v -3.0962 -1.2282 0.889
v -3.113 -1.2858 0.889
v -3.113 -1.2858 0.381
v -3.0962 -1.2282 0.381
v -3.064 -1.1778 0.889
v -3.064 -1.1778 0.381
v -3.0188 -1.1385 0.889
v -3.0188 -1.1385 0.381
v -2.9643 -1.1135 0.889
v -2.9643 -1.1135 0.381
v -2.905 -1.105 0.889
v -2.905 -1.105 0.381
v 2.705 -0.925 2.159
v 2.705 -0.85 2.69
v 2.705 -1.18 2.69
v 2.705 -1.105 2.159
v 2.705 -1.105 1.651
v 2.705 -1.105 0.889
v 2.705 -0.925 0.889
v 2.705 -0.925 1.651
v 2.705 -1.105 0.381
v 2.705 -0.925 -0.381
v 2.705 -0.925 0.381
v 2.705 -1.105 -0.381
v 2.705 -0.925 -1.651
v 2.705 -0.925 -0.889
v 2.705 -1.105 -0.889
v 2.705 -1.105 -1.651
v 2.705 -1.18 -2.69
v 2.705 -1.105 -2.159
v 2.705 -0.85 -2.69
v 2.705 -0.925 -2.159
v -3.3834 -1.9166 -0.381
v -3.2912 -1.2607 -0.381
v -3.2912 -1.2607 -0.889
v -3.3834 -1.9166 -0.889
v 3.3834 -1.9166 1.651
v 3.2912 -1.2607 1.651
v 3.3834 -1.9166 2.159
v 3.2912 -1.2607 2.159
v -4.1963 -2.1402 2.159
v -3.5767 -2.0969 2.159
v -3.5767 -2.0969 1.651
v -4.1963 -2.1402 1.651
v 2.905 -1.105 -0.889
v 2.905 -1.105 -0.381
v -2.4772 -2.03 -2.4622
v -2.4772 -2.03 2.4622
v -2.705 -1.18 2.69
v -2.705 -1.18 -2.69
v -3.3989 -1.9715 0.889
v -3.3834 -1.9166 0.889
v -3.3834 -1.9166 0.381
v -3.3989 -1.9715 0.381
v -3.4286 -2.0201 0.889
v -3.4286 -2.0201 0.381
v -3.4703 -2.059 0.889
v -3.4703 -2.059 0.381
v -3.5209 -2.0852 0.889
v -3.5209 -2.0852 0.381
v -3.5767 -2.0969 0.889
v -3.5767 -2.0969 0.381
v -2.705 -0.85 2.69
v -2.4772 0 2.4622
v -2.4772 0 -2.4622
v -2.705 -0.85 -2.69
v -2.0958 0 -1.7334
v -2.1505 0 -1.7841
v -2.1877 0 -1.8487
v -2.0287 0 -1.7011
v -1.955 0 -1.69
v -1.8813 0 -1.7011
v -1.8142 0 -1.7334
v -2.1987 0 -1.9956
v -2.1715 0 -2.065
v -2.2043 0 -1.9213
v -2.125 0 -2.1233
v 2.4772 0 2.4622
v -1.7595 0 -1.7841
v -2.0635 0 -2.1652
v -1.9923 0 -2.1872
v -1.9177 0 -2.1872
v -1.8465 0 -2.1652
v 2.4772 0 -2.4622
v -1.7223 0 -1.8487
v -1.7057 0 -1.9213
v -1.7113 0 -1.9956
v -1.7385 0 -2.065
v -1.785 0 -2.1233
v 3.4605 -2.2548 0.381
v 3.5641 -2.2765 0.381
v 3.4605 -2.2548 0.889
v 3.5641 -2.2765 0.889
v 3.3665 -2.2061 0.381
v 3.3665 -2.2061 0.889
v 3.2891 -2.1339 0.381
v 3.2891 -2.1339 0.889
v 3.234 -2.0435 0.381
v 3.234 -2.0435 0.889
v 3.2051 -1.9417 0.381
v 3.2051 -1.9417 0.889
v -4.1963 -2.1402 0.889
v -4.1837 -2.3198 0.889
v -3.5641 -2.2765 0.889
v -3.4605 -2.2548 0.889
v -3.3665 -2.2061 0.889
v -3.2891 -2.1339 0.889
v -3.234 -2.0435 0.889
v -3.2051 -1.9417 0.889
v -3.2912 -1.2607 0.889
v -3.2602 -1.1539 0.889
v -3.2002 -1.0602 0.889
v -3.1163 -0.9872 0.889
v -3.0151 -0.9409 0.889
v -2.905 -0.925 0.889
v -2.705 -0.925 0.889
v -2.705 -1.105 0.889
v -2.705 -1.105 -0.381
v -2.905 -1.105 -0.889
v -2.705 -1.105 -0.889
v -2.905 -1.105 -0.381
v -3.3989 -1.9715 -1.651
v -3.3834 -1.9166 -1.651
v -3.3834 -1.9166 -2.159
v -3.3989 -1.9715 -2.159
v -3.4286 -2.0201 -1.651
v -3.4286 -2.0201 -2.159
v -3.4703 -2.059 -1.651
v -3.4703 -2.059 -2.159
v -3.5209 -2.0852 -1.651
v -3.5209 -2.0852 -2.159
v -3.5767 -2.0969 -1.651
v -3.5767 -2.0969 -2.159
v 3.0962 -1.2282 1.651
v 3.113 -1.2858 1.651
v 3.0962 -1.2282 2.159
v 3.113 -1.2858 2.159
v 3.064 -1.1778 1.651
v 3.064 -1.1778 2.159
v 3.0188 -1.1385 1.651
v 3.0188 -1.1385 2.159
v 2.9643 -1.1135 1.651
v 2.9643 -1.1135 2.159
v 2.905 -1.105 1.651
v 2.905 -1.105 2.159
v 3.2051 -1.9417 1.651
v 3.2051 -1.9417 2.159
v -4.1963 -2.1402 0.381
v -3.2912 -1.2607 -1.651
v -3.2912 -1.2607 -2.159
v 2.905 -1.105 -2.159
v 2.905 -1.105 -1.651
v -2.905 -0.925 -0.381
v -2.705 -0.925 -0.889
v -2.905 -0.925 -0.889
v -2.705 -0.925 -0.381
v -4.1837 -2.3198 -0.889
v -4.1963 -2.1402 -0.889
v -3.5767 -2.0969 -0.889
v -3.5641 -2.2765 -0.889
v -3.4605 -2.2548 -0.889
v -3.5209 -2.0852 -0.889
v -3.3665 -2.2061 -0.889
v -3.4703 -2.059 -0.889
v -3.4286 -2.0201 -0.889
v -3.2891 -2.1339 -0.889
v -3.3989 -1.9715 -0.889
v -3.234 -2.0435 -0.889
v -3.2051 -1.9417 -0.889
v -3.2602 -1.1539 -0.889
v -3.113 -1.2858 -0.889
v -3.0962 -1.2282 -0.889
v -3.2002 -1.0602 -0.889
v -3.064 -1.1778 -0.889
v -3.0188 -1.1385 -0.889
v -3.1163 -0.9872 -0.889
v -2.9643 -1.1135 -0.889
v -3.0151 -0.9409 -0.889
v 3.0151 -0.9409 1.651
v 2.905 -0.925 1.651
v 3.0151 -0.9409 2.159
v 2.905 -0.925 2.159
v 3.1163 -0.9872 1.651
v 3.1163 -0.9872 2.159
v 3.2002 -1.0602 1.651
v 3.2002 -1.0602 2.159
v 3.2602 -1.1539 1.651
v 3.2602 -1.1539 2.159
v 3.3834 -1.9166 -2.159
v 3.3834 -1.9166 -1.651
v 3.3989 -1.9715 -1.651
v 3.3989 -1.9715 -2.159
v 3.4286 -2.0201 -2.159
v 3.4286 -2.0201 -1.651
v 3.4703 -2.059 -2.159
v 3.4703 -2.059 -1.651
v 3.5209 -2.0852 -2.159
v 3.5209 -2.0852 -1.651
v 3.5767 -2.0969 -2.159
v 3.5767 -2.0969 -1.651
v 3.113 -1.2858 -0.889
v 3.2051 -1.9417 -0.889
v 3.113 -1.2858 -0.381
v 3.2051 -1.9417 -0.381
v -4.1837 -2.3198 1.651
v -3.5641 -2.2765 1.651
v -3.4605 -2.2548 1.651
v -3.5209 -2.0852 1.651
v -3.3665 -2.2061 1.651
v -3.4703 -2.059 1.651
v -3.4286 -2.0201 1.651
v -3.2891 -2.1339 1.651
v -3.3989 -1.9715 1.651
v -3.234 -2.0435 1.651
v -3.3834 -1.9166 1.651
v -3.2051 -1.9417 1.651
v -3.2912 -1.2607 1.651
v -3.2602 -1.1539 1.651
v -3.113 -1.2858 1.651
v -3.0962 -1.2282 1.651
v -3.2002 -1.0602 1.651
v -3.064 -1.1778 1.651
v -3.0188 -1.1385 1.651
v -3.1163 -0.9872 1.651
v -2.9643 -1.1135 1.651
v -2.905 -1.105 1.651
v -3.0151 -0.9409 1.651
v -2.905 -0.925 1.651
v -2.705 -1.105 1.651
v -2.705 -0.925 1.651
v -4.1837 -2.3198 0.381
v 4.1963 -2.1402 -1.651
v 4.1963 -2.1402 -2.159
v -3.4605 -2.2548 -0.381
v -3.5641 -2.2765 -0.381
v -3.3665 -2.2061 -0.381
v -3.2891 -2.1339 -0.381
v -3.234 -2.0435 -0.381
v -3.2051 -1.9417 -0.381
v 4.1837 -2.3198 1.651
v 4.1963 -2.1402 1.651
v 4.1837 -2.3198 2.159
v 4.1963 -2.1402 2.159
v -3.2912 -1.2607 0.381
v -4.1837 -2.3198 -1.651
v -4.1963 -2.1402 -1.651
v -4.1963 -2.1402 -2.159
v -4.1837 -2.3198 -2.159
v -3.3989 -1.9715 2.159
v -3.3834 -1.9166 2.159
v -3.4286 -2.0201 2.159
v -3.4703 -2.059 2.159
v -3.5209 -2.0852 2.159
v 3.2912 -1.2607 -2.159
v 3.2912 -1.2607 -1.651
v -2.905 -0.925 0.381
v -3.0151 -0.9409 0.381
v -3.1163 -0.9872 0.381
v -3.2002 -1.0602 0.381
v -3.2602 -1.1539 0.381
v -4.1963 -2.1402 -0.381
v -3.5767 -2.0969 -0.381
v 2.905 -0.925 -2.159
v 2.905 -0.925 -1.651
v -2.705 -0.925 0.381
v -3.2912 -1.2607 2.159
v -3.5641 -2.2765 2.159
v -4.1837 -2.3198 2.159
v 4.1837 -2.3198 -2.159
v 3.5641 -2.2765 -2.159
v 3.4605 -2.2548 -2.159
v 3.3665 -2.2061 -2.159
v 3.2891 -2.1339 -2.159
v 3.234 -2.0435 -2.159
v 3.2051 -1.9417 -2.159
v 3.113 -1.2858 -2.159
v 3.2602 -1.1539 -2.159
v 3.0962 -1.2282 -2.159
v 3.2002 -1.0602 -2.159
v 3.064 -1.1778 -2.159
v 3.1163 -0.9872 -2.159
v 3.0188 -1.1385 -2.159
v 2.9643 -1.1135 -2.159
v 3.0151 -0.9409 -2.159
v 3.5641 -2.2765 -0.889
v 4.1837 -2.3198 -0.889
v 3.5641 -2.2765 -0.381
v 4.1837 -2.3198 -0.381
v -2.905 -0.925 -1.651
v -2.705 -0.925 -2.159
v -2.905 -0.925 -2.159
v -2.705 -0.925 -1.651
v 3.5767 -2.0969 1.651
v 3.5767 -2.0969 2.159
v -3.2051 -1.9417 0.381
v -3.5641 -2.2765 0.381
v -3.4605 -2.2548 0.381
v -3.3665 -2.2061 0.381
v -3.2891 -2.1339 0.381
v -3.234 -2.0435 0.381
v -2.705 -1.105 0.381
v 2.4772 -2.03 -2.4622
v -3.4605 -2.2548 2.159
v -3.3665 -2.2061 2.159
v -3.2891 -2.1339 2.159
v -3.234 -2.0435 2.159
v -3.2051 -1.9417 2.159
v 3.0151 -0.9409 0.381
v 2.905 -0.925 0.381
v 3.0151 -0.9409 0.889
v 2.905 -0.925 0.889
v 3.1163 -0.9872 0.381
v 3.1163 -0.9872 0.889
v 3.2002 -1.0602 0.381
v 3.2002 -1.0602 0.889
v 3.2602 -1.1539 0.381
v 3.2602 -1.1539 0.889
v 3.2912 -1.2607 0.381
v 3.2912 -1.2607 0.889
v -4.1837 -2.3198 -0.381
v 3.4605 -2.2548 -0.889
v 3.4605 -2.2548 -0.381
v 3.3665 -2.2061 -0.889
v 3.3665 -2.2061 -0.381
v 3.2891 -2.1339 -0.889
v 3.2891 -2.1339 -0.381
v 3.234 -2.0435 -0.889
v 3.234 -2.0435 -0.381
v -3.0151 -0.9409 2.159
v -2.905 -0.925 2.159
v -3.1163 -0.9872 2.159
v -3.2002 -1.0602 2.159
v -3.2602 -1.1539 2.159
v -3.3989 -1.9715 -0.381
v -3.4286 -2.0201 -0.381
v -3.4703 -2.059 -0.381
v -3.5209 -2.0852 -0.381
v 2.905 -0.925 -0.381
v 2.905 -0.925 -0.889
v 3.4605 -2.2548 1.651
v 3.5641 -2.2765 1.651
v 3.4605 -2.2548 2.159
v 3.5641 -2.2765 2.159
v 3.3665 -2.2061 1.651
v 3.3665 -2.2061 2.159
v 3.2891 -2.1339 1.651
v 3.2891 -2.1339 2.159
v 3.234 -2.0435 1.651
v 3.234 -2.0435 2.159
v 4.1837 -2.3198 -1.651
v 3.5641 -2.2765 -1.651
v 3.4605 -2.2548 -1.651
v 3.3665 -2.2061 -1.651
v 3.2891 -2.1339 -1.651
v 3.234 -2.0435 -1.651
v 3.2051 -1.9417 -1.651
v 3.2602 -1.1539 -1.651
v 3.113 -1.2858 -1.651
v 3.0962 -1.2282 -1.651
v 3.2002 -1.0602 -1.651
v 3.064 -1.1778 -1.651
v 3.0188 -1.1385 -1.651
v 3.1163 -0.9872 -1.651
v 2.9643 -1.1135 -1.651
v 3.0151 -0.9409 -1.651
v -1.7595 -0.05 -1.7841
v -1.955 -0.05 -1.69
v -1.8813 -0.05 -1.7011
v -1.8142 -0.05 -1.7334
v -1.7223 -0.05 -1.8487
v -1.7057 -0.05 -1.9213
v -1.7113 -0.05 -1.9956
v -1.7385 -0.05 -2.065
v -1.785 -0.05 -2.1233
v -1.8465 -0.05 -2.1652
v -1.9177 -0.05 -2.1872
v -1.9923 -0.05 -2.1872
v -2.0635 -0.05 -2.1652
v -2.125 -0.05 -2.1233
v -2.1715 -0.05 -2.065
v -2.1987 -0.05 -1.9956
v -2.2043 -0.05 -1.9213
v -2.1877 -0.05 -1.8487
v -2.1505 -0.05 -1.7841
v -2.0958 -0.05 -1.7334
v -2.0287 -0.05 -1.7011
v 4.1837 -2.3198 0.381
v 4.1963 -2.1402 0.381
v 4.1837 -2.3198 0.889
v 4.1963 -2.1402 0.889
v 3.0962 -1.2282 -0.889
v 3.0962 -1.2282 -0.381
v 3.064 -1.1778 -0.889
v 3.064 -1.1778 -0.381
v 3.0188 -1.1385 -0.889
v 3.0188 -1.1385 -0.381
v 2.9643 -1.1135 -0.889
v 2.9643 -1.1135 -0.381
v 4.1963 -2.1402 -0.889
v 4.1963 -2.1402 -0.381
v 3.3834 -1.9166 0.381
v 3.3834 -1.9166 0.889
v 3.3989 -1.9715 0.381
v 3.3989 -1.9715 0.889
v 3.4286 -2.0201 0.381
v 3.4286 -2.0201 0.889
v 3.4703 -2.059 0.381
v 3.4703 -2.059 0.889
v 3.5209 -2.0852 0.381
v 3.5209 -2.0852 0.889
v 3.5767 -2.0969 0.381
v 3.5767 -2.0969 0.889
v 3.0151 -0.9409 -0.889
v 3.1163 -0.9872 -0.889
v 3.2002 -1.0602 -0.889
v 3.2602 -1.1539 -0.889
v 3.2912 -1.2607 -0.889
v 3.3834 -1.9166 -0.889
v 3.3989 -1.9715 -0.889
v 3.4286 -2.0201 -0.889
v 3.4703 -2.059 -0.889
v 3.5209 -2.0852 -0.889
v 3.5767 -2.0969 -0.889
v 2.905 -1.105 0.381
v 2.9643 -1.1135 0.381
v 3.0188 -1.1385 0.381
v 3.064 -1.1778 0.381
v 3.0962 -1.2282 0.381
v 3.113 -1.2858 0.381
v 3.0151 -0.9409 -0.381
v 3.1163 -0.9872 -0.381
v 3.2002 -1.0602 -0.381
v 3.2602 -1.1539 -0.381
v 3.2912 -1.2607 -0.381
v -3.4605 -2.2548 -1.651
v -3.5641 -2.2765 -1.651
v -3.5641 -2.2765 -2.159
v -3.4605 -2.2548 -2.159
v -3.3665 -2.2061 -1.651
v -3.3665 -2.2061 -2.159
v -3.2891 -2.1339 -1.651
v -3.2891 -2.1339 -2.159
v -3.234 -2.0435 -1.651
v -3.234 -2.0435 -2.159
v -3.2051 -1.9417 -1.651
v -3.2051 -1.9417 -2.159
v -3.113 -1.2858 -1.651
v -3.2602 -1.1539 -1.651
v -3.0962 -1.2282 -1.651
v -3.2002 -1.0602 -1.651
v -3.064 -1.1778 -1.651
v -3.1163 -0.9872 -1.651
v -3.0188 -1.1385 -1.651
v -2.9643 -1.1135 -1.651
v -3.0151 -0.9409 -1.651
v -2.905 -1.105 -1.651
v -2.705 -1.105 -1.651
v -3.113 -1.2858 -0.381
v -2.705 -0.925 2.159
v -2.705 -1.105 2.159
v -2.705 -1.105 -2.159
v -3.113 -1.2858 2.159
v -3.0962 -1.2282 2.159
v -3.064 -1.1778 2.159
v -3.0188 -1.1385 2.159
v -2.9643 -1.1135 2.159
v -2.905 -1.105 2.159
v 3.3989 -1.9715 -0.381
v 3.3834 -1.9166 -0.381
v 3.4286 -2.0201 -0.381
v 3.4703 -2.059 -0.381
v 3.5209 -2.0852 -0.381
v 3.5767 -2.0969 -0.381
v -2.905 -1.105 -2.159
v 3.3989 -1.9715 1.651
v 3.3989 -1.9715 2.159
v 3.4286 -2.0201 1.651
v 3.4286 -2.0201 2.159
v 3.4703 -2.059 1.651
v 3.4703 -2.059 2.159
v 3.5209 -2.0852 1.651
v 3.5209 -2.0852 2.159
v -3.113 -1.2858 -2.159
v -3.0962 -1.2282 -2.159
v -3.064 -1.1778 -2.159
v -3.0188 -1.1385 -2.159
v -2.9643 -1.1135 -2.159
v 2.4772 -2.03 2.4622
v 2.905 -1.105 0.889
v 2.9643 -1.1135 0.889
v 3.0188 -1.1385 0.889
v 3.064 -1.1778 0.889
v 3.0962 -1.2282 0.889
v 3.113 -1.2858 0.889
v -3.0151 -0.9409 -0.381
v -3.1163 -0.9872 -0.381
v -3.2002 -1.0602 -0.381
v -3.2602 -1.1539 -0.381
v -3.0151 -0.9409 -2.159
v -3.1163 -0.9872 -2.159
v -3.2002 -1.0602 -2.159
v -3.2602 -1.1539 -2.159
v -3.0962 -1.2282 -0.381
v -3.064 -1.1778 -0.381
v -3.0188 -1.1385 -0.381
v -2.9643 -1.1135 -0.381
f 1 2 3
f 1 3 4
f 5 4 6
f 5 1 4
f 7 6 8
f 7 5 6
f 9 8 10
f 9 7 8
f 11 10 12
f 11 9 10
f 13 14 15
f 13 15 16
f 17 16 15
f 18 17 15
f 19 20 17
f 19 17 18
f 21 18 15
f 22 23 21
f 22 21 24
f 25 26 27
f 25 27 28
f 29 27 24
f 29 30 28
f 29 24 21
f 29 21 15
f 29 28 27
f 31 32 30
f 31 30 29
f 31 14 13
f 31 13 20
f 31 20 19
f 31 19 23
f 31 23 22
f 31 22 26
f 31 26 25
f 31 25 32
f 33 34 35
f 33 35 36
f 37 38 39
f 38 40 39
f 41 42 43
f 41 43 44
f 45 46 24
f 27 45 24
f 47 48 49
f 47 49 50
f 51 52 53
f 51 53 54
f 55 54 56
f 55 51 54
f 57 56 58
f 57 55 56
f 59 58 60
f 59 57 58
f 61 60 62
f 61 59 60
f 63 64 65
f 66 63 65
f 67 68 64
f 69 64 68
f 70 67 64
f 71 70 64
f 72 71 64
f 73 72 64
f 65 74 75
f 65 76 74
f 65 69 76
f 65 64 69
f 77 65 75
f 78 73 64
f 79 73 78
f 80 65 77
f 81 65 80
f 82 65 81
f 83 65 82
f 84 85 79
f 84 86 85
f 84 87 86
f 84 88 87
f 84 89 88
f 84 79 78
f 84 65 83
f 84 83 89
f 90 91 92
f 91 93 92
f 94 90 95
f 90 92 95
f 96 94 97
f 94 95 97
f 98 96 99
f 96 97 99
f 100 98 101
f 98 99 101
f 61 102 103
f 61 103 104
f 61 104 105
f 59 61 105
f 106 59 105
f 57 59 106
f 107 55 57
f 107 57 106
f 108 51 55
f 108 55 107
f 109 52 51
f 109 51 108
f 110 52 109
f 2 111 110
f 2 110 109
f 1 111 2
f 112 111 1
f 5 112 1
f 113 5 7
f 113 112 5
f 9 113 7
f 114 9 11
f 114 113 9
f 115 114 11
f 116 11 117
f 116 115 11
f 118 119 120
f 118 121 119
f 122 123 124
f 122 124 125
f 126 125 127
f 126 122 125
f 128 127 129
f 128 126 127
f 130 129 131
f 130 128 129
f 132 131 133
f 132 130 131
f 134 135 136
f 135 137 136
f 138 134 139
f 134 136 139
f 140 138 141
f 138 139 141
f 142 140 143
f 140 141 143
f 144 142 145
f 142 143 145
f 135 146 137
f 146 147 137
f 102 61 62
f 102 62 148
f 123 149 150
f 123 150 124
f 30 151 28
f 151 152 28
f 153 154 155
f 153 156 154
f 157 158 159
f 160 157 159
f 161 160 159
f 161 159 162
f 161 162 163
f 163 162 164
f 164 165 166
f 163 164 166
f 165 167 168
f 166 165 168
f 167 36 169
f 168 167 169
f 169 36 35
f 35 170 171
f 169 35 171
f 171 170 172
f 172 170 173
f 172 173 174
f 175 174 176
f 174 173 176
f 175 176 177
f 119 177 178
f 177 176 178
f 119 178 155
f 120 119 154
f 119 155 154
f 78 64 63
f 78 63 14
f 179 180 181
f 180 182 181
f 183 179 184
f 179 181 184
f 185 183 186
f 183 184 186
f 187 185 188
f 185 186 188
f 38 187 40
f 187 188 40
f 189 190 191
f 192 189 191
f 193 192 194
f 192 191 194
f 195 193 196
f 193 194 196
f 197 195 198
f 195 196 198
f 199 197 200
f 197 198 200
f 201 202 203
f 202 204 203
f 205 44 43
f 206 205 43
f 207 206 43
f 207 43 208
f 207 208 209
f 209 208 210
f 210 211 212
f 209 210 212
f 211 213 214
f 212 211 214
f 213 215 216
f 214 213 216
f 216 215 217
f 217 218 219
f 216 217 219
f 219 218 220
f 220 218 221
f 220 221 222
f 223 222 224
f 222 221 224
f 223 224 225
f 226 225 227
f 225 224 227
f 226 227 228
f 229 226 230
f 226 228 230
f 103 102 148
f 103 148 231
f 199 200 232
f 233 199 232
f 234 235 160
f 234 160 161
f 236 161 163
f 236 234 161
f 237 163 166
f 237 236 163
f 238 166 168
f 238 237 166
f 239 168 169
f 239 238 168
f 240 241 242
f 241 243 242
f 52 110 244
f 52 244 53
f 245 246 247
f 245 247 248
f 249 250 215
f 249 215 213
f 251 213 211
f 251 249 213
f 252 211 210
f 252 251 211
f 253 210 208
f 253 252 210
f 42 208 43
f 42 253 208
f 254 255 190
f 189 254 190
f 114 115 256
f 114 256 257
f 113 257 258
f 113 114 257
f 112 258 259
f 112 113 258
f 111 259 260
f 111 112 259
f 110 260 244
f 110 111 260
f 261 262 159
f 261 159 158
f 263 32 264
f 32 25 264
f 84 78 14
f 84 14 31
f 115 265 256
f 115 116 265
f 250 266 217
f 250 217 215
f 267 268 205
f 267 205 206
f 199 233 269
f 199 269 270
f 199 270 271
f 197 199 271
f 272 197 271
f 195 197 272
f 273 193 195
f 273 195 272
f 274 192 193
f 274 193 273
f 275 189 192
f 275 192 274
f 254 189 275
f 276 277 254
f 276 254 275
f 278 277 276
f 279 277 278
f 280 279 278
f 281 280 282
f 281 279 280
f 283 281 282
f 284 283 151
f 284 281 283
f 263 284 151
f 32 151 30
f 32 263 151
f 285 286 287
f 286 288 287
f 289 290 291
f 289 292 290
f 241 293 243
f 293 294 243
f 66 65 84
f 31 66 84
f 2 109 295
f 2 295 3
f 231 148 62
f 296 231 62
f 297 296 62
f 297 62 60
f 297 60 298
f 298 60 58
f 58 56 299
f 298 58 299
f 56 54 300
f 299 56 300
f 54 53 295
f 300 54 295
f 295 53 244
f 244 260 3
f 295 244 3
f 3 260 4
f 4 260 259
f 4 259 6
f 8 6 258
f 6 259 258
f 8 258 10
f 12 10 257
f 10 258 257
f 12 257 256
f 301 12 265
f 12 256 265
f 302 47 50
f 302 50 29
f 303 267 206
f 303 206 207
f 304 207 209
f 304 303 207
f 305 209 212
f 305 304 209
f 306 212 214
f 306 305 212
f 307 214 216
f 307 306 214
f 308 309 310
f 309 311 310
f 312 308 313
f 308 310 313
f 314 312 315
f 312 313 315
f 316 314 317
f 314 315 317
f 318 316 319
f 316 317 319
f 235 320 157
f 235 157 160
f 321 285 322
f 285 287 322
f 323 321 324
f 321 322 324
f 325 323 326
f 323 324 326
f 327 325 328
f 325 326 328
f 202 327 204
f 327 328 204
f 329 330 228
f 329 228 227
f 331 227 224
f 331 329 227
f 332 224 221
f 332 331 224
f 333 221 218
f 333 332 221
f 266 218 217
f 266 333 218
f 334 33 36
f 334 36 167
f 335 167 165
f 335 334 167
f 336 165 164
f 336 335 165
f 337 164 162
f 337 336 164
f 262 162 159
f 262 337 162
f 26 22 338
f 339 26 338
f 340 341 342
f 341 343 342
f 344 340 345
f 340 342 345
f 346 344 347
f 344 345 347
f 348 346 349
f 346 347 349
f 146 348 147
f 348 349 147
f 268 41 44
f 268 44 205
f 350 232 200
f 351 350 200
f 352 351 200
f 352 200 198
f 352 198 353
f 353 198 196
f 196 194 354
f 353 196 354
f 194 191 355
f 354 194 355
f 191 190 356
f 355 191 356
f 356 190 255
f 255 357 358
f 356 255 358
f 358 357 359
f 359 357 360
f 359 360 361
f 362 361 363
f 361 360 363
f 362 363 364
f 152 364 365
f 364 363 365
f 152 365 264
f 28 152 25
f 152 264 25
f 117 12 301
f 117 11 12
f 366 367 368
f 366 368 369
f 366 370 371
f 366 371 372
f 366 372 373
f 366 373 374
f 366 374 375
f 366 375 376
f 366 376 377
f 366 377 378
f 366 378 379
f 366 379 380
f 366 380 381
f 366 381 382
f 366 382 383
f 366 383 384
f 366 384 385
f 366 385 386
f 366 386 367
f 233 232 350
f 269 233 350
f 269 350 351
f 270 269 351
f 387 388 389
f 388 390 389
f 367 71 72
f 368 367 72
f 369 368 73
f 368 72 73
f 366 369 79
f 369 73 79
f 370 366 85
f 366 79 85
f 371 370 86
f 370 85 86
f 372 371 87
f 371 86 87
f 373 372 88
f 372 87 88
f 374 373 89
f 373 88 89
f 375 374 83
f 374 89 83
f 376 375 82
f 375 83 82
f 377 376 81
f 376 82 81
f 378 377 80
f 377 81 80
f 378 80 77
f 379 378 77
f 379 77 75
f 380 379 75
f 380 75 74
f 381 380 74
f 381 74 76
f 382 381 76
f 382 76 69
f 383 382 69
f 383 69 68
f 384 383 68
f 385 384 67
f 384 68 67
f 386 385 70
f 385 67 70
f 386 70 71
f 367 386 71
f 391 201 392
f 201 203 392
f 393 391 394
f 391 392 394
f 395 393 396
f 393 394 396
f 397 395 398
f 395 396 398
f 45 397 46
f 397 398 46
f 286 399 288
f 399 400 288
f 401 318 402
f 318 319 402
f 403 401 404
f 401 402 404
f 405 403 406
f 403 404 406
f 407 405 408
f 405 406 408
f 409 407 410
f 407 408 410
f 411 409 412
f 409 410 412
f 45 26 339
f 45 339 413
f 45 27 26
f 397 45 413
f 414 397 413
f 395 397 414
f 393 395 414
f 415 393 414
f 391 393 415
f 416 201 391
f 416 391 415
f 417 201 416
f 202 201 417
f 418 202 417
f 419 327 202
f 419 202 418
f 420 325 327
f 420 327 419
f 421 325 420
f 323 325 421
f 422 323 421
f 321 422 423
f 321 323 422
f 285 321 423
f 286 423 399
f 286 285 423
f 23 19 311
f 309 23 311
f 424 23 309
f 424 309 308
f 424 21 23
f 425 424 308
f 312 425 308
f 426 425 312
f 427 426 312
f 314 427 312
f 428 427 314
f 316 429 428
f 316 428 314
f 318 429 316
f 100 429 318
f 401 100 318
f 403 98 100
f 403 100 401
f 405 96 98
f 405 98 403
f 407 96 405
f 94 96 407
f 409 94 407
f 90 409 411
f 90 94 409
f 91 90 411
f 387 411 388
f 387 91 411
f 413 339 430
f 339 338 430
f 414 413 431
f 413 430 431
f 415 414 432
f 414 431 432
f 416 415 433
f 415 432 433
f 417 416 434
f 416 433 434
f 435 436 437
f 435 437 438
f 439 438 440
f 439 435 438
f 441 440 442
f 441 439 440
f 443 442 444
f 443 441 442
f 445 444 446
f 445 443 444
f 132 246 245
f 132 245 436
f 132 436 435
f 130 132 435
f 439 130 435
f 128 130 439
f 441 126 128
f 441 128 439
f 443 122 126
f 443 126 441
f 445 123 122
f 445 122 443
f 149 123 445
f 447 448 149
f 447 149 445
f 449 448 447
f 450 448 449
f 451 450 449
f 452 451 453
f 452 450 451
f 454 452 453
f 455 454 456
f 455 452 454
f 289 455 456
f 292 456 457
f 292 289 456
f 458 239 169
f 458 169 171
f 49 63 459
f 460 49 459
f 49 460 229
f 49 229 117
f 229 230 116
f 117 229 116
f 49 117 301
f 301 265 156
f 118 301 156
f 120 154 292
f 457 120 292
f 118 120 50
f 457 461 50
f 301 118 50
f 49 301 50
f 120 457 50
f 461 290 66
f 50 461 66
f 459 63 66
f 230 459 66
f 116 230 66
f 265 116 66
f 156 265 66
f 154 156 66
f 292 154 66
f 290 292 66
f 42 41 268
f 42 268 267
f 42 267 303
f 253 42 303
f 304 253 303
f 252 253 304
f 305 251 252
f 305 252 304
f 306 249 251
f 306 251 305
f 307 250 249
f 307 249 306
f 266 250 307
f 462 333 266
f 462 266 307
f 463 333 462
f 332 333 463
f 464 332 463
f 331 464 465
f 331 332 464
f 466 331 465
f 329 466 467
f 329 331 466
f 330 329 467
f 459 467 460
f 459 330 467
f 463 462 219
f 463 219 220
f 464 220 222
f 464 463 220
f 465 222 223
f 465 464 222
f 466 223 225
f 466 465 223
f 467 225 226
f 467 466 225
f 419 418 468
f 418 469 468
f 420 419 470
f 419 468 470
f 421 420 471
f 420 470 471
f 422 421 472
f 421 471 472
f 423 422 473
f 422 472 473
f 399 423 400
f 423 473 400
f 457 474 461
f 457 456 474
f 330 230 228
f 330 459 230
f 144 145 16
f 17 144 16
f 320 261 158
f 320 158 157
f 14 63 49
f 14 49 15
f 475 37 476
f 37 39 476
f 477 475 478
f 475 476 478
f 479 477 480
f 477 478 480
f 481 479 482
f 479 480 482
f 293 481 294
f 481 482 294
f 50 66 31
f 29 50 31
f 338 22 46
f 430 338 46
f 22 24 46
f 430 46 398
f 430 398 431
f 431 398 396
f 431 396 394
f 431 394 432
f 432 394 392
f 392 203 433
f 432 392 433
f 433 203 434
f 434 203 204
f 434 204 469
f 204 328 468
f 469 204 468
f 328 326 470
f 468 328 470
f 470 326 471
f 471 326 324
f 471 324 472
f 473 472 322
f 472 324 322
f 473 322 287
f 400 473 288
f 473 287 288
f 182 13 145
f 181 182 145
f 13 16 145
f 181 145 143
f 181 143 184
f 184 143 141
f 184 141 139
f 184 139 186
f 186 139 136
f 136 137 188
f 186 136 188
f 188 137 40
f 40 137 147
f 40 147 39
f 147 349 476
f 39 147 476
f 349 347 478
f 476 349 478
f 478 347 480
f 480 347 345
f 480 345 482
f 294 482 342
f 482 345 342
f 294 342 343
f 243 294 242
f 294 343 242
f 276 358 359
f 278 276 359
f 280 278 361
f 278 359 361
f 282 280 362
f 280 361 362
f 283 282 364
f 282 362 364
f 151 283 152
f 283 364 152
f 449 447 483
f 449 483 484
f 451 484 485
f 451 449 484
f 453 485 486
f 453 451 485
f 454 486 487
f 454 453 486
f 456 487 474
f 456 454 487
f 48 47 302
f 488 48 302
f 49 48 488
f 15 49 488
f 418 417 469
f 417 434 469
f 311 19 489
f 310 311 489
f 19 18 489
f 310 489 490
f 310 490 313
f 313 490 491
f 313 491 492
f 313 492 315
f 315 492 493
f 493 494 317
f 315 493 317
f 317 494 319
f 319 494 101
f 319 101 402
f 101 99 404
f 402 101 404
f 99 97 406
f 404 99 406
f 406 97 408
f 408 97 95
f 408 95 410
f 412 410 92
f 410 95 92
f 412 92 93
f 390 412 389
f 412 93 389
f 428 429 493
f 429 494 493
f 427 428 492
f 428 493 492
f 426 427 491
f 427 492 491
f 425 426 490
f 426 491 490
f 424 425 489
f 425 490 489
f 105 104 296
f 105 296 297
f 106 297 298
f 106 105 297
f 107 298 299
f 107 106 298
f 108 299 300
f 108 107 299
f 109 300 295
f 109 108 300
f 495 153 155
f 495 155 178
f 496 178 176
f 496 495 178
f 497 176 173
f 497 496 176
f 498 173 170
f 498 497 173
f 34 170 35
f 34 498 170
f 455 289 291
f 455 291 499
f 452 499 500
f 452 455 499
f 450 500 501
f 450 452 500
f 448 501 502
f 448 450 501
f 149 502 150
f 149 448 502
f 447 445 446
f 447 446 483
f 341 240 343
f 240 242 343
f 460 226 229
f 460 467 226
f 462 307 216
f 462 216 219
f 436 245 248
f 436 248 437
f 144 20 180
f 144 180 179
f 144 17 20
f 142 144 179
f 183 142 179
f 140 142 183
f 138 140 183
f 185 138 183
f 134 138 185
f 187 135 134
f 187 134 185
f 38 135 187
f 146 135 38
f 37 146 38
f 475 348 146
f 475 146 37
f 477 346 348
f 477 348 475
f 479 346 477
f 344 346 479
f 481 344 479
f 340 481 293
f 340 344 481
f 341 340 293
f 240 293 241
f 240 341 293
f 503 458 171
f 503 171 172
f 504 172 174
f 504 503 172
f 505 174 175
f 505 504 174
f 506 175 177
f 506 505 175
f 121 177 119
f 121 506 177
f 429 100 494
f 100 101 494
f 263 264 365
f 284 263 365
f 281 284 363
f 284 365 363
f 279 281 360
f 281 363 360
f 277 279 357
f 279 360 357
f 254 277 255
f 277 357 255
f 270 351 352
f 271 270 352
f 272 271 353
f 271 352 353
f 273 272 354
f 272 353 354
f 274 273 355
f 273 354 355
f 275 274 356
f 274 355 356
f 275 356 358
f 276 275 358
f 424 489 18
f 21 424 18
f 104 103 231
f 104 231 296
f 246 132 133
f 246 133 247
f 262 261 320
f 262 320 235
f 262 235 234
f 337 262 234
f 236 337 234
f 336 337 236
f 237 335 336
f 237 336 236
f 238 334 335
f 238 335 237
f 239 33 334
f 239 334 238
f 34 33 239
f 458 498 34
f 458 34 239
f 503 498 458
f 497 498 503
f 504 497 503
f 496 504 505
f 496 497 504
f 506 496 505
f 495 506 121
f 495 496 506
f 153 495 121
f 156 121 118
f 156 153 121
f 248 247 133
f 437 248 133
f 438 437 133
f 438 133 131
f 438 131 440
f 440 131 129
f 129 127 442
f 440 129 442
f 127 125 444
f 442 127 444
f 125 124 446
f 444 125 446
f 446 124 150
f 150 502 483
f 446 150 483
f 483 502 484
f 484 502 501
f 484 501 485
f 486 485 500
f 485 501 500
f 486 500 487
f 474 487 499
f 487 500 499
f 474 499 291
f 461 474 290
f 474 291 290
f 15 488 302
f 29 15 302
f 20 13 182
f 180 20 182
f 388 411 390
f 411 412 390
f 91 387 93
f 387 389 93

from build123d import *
from OCP.BRepFilletAPI import BRepFilletAPI_MakeChamfer

# Parameters (mm, degrees)
SKETCH1_W              = 5.41
SKETCH1_H              = 5.38
BASE_EXTRUDE_DEPTH     = 2.03
PIN_1_DEPTH            = 0.254
LPATTERN1_COUNT        = 4
LPATTERN1_PITCH        = 1.27
LPATTERN1_COPY_1_DEPTH = 0.254
LPATTERN1_COPY_2_DEPTH = 0.254
LPATTERN1_COPY_3_DEPTH = 0.254
TOP_CHAMFER_SIZE       = 0.85
TOP_CHAMFER_SIZE2      = 0.227756814
BOTTOM_CHAMFER_SIZE    = 0.85
BOTTOM_CHAMFER_SIZE2   = 0.227756814
SKETCH3_R              = 0.25
PIN1_HOL_DEPTH         = 0.05


with BuildPart() as part:
    # Sketch1 → Base-Extrude (new body)
    with BuildSketch(Plane(origin=(0, 0, 0), x_dir=(1, 0, 0), z_dir=(0, 1, 0))):
        Rectangle(SKETCH1_W, SKETCH1_H)
    extrude(amount=-BASE_EXTRUDE_DEPTH)

    # Sketch2 → PIN 1 (add, symmetric)
    with BuildSketch(Plane.XY.offset(-1.905)):
        with BuildLine():
            Line((-2.705, -0.925), (-2.905, -0.925))
            ThreePointArc((-2.905, -0.925), (-3.160863021, -1.020663264), (-3.291204547, -1.260722491))
            Line((-3.291204547, -1.260722491), (-3.38338656, -1.916631596))
            ThreePointArc((-3.38338656, -1.916631596), (-3.448123199, -2.040989522), (-3.576693995, -2.096893695))
            Line((-3.576693995, -2.096893695), (-4.196278083, -2.140219235))
            Line((-4.196278083, -2.140219235), (-4.183721917, -2.319780765))
            Line((-4.183721917, -2.319780765), (-3.56413783, -2.276455225))
            ThreePointArc((-3.56413783, -2.276455225), (-3.325363494, -2.172633189), (-3.205138308, -1.941682754))
            Line((-3.205138308, -1.941682754), (-3.112956294, -1.285773649))
            ThreePointArc((-3.112956294, -1.285773649), (-3.042772396, -1.156510988), (-2.905, -1.105))
            Line((-2.905, -1.105), (-2.705, -1.105))
            Line((-2.705, -1.105), (-2.705, -0.925))
        make_face()
    pin_1 = extrude(amount=PIN_1_DEPTH, both=True)

    # PIN 8: PIN 1 across plane
    add(pin_1.mirror(Plane(origin=(0, 0, 0), x_dir=(0, 0, 1), z_dir=(1, 0, 0))))

    # LPattern1: PIN 1 ×4
    with Locations(*[(0, 0, i * LPATTERN1_PITCH) for i in range(1, LPATTERN1_COUNT)]):
        add(pin_1)

    # LPattern1 copy 1 sketch → LPattern1 copy 1 (add, symmetric)
    with BuildSketch(Plane(origin=(0, 0, -0.635), x_dir=(-1, 0, 0), z_dir=(0, 0, 1))):
        with BuildLine():
            Line((-2.705, 0.925), (-2.905, 0.925))
            ThreePointArc((-2.905, 0.925), (-3.160863021, 1.020663264), (-3.291204547, 1.260722491))
            Line((-3.291204547, 1.260722491), (-3.38338656, 1.916631596))
            ThreePointArc((-3.38338656, 1.916631596), (-3.448123199, 2.040989522), (-3.576693995, 2.096893695))
            Line((-3.576693995, 2.096893695), (-4.196278083, 2.140219235))
            Line((-4.196278083, 2.140219235), (-4.183721917, 2.319780765))
            Line((-4.183721917, 2.319780765), (-3.56413783, 2.276455225))
            ThreePointArc((-3.56413783, 2.276455225), (-3.325363494, 2.172633189), (-3.205138308, 1.941682754))
            Line((-3.205138308, 1.941682754), (-3.112956294, 1.285773649))
            ThreePointArc((-3.112956294, 1.285773649), (-3.042772396, 1.156510988), (-2.905, 1.105))
            Line((-2.905, 1.105), (-2.705, 1.105))
            Line((-2.705, 1.105), (-2.705, 0.925))
        make_face()
    extrude(amount=LPATTERN1_COPY_1_DEPTH, both=True)

    # LPattern1 copy 2 sketch → LPattern1 copy 2 (add, symmetric)
    with BuildSketch(Plane(origin=(0, 0, 0.635), x_dir=(-1, 0, 0), z_dir=(0, 0, 1))):
        with BuildLine():
            Line((-2.705, 0.925), (-2.905, 0.925))
            ThreePointArc((-2.905, 0.925), (-3.160863021, 1.020663264), (-3.291204547, 1.260722491))
            Line((-3.291204547, 1.260722491), (-3.38338656, 1.916631596))
            ThreePointArc((-3.38338656, 1.916631596), (-3.448123199, 2.040989522), (-3.576693995, 2.096893695))
            Line((-3.576693995, 2.096893695), (-4.196278083, 2.140219235))
            Line((-4.196278083, 2.140219235), (-4.183721917, 2.319780765))
            Line((-4.183721917, 2.319780765), (-3.56413783, 2.276455225))
            ThreePointArc((-3.56413783, 2.276455225), (-3.325363494, 2.172633189), (-3.205138308, 1.941682754))
            Line((-3.205138308, 1.941682754), (-3.112956294, 1.285773649))
            ThreePointArc((-3.112956294, 1.285773649), (-3.042772396, 1.156510988), (-2.905, 1.105))
            Line((-2.905, 1.105), (-2.705, 1.105))
            Line((-2.705, 1.105), (-2.705, 0.925))
        make_face()
    extrude(amount=LPATTERN1_COPY_2_DEPTH, both=True)

    # LPattern1 copy 3 sketch → LPattern1 copy 3 (add, symmetric)
    with BuildSketch(Plane(origin=(0, 0, 1.905), x_dir=(-1, 0, 0), z_dir=(0, 0, 1))):
        with BuildLine():
            Line((-2.705, 0.925), (-2.905, 0.925))
            ThreePointArc((-2.905, 0.925), (-3.160863021, 1.020663264), (-3.291204547, 1.260722491))
            Line((-3.291204547, 1.260722491), (-3.38338656, 1.916631596))
            ThreePointArc((-3.38338656, 1.916631596), (-3.448123199, 2.040989522), (-3.576693995, 2.096893695))
            Line((-3.576693995, 2.096893695), (-4.196278083, 2.140219235))
            Line((-4.196278083, 2.140219235), (-4.183721917, 2.319780765))
            Line((-4.183721917, 2.319780765), (-3.56413783, 2.276455225))
            ThreePointArc((-3.56413783, 2.276455225), (-3.325363494, 2.172633189), (-3.205138308, 1.941682754))
            Line((-3.205138308, 1.941682754), (-3.112956294, 1.285773649))
            ThreePointArc((-3.112956294, 1.285773649), (-3.042772396, 1.156510988), (-2.905, 1.105))
            Line((-2.905, 1.105), (-2.705, 1.105))
            Line((-2.705, 1.105), (-2.705, 0.925))
        make_face()
    extrude(amount=LPATTERN1_COPY_3_DEPTH, both=True)

    # TOP CHAMFER: one chamfer whose edges measure the first distance from different faces: ONE call of the kernel's chamfer builder (chamfer() names one face for all edges)
    top_chamfer_edges_1 = [part.edges().sort_by_distance(p)[0] for p in [
        (0, 0, -2.69),
    ]]
    top_chamfer_side_1 = [part.faces().sort_by_distance(p)[0] for p in [
        (0, -1.015, -2.69),
    ]]
    top_chamfer_edges_2 = [part.edges().sort_by_distance(p)[0] for p in [
        (2.705, 0, 0),
    ]]
    top_chamfer_side_2 = [part.faces().sort_by_distance(p)[0] for p in [
        (2.705, -1.015, 0),
    ]]
    top_chamfer_edges_3 = [part.edges().sort_by_distance(p)[0] for p in [
        (0, 0, 2.69),
    ]]
    top_chamfer_side_3 = [part.faces().sort_by_distance(p)[0] for p in [
        (0, -1.015, 2.69),
    ]]
    top_chamfer_edges_4 = [part.edges().sort_by_distance(p)[0] for p in [
        (-2.705, 0, 0),
    ]]
    top_chamfer_side_4 = [part.faces().sort_by_distance(p)[0] for p in [
        (-2.705, -1.015, 0),
    ]]
    top_chamfer = BRepFilletAPI_MakeChamfer(part.part.solid().wrapped)
    for e in top_chamfer_edges_1:
        top_chamfer.Add(TOP_CHAMFER_SIZE, TOP_CHAMFER_SIZE2, e.wrapped, top_chamfer_side_1[0].wrapped)  # the first distance lies on this face
    for e in top_chamfer_edges_2:
        top_chamfer.Add(TOP_CHAMFER_SIZE, TOP_CHAMFER_SIZE2, e.wrapped, top_chamfer_side_2[0].wrapped)  # the first distance lies on this face
    for e in top_chamfer_edges_3:
        top_chamfer.Add(TOP_CHAMFER_SIZE, TOP_CHAMFER_SIZE2, e.wrapped, top_chamfer_side_3[0].wrapped)  # the first distance lies on this face
    for e in top_chamfer_edges_4:
        top_chamfer.Add(TOP_CHAMFER_SIZE, TOP_CHAMFER_SIZE2, e.wrapped, top_chamfer_side_4[0].wrapped)  # the first distance lies on this face
    add(Compound.cast(top_chamfer.Shape()), mode=Mode.REPLACE)

    # BOTTOM CHAMFER: one chamfer whose edges measure the first distance from different faces: ONE call of the kernel's chamfer builder (chamfer() names one face for all edges)
    bottom_chamfer_edges_1 = [part.edges().sort_by_distance(p)[0] for p in [
        (2.705, -2.03, 0),
    ]]
    bottom_chamfer_side_1 = [part.faces().sort_by_distance(p)[0] for p in [
        (2.705, -1.465983178, 0),
    ]]
    bottom_chamfer_edges_2 = [part.edges().sort_by_distance(p)[0] for p in [
        (0, -2.03, -2.69),
    ]]
    bottom_chamfer_side_2 = [part.faces().sort_by_distance(p)[0] for p in [
        (0, -1.44, -2.69),
    ]]
    bottom_chamfer_edges_3 = [part.edges().sort_by_distance(p)[0] for p in [
        (-2.705, -2.03, 0),
    ]]
    bottom_chamfer_side_3 = [part.faces().sort_by_distance(p)[0] for p in [
        (-2.705, -1.465983178, 0),
    ]]
    bottom_chamfer_edges_4 = [part.edges().sort_by_distance(p)[0] for p in [
        (0, -2.03, 2.69),
    ]]
    bottom_chamfer_side_4 = [part.faces().sort_by_distance(p)[0] for p in [
        (0, -1.44, 2.69),
    ]]
    bottom_chamfer = BRepFilletAPI_MakeChamfer(part.part.solid().wrapped)
    for e in bottom_chamfer_edges_1:
        bottom_chamfer.Add(BOTTOM_CHAMFER_SIZE, BOTTOM_CHAMFER_SIZE2, e.wrapped, bottom_chamfer_side_1[0].wrapped)  # the first distance lies on this face
    for e in bottom_chamfer_edges_2:
        bottom_chamfer.Add(BOTTOM_CHAMFER_SIZE, BOTTOM_CHAMFER_SIZE2, e.wrapped, bottom_chamfer_side_2[0].wrapped)  # the first distance lies on this face
    for e in bottom_chamfer_edges_3:
        bottom_chamfer.Add(BOTTOM_CHAMFER_SIZE, BOTTOM_CHAMFER_SIZE2, e.wrapped, bottom_chamfer_side_3[0].wrapped)  # the first distance lies on this face
    for e in bottom_chamfer_edges_4:
        bottom_chamfer.Add(BOTTOM_CHAMFER_SIZE, BOTTOM_CHAMFER_SIZE2, e.wrapped, bottom_chamfer_side_4[0].wrapped)  # the first distance lies on this face
    add(Compound.cast(bottom_chamfer.Shape()), mode=Mode.REPLACE)

    # Sketch3 → PIN1 HOL (cut)
    with BuildSketch(Plane(origin=(0, 0, 0), x_dir=(-1, 0, 0), z_dir=(0, 1, 0))):
        with Locations(Location((1.955, -1.94, 0), (0, 0, 90))):
            Circle(SKETCH3_R)
    extrude(amount=-PIN1_HOL_DEPTH, mode=Mode.SUBTRACT)


solid = part.part
